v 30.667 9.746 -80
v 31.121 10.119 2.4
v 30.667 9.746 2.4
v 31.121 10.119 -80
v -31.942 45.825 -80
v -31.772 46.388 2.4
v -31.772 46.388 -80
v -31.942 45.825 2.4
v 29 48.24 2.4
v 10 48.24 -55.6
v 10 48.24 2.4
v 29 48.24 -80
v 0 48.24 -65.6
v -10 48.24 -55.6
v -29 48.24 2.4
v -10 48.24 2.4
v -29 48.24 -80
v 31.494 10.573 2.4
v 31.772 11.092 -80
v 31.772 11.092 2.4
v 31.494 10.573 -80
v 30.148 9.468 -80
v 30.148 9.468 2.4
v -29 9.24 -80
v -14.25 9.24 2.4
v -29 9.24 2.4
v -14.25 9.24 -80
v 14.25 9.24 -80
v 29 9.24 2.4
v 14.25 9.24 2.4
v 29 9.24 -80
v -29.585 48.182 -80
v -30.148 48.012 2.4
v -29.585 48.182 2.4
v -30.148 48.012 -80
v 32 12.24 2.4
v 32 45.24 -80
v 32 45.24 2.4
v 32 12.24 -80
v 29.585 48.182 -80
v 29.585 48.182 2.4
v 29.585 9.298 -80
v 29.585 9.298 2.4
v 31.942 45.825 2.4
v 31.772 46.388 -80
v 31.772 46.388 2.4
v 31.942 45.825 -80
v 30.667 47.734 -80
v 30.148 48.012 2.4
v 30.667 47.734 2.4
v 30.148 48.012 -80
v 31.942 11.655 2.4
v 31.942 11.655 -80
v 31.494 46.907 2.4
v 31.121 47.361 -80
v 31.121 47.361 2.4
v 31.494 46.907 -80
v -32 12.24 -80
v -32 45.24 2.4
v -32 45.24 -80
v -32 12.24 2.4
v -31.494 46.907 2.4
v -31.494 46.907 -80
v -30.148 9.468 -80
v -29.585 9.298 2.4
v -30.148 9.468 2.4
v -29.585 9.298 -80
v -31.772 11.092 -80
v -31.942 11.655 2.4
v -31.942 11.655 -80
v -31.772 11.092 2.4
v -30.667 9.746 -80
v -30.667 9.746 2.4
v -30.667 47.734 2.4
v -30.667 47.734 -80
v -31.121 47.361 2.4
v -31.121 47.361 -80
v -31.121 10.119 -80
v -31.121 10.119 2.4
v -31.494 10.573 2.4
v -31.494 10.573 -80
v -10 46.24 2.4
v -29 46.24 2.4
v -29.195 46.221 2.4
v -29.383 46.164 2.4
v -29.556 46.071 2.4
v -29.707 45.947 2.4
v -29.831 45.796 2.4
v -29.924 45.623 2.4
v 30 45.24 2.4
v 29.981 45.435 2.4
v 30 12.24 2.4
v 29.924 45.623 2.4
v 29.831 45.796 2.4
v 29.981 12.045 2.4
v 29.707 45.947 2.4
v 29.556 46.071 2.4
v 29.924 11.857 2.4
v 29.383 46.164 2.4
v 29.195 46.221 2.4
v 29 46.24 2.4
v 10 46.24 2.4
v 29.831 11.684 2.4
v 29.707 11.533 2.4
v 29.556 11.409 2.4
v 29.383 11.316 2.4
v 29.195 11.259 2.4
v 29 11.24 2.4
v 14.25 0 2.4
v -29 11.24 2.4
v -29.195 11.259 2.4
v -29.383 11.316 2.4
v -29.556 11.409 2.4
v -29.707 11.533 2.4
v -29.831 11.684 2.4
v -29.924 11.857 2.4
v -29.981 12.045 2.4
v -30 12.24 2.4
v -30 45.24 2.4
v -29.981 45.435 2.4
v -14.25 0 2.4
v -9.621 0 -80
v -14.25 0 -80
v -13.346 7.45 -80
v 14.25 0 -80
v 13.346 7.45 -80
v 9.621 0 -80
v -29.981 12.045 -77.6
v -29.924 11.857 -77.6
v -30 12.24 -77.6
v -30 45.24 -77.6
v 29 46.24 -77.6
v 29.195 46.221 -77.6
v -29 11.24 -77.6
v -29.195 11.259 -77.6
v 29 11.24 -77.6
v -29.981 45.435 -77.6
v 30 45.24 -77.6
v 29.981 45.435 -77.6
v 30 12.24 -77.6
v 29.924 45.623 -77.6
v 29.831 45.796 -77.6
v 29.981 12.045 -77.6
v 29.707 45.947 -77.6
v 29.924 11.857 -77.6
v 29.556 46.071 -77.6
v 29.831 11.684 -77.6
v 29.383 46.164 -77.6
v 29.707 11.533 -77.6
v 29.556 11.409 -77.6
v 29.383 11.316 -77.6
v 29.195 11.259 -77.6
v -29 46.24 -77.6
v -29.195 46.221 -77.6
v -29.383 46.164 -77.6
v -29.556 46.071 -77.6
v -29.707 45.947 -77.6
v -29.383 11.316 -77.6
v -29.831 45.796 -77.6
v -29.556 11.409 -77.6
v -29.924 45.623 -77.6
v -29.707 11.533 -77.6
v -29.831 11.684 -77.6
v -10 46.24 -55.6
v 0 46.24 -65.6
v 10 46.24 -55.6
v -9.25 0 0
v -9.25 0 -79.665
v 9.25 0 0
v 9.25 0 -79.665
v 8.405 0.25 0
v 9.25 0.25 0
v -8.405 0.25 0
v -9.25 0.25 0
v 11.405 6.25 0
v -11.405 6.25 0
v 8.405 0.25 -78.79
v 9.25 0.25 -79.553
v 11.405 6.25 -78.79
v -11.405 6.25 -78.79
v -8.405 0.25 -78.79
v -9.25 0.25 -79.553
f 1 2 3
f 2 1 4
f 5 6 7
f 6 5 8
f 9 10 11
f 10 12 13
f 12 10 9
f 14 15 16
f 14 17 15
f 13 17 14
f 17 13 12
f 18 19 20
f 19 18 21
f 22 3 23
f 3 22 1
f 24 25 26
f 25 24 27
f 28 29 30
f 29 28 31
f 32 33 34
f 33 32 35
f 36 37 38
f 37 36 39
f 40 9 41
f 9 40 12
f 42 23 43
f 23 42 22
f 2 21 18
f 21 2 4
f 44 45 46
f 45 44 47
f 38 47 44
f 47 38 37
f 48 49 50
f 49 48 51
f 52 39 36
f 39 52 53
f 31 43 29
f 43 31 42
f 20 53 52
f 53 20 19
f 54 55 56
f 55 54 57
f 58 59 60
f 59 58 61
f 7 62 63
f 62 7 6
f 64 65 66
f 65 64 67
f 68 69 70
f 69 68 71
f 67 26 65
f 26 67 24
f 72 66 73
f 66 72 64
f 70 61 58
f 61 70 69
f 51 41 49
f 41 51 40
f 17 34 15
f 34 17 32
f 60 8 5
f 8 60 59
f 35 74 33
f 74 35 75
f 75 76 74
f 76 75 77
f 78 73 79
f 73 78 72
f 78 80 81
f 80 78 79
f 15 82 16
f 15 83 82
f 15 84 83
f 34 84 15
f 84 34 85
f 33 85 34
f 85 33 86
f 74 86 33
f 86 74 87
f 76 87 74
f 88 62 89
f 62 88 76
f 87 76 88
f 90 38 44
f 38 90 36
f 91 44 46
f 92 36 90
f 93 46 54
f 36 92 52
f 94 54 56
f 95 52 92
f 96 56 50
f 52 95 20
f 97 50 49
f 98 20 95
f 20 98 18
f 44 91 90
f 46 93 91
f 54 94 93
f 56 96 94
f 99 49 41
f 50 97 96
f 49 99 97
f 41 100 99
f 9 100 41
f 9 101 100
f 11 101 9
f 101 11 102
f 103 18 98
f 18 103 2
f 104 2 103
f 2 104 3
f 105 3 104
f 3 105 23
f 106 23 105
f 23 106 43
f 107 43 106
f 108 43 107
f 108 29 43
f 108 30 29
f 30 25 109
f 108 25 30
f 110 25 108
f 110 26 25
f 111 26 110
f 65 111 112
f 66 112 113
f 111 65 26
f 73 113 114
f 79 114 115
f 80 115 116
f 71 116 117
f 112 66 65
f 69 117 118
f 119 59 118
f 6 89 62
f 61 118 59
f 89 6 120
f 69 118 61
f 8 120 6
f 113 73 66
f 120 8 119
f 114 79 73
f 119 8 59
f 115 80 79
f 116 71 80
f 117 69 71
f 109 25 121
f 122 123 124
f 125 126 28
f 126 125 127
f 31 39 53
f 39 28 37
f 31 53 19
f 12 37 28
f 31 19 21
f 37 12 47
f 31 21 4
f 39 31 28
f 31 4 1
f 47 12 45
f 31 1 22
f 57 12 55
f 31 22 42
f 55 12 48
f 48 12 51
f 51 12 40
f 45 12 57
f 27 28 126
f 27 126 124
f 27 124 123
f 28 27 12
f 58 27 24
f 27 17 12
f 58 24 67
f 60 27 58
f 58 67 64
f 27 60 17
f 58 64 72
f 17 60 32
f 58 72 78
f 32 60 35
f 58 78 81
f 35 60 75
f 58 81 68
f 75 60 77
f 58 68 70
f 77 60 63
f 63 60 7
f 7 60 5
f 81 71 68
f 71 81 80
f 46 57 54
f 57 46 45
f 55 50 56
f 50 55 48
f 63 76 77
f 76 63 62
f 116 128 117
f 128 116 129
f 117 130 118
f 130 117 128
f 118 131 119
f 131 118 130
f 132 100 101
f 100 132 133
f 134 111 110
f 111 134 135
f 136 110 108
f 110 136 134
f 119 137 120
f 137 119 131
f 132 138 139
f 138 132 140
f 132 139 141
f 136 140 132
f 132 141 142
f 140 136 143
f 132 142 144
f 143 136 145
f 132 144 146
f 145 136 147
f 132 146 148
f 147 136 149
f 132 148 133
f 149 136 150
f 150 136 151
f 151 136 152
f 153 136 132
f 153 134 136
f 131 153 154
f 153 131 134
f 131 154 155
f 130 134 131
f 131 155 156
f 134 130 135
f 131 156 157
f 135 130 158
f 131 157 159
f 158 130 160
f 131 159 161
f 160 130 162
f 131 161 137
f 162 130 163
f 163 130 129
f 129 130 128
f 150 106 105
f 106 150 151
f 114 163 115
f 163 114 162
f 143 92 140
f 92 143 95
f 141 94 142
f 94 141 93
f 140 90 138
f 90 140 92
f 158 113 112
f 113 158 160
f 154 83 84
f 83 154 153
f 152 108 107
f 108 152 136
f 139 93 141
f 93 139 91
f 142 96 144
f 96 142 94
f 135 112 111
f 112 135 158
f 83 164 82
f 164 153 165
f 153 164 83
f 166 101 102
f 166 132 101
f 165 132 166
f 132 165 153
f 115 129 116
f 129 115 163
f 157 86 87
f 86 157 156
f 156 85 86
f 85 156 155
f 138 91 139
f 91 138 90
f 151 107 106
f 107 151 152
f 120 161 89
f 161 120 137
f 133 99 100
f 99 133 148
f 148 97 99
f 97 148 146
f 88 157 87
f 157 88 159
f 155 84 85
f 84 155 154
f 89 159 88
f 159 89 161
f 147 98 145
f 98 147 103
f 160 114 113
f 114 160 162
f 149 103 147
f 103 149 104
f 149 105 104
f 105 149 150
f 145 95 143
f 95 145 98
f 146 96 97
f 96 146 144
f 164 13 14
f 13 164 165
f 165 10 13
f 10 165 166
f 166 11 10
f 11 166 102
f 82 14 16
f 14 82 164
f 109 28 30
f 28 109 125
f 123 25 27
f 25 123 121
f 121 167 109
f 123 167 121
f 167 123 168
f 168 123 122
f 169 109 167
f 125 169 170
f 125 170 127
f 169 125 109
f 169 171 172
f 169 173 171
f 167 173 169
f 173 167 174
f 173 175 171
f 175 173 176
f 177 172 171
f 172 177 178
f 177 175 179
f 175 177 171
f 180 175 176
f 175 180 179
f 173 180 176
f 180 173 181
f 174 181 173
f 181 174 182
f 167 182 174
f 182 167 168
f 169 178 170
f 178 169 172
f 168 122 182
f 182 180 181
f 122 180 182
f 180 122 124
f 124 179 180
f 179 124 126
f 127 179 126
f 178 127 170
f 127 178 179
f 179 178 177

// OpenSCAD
// Bunk cubby: a customizable open-top bin that hangs on rail clips
// (clip.scad), lowered on from above. Remotes, glasses, books, toys: set the inside size, add
// dividers, and pick 1 or 2 clips.
//
// Print upright as modeled, no supports.

use <rail-clip.scad>

/* [Inside size] */
width = 60;       // along the rail
depth = 35;       // away from the rail
height = 80;      // wall height above the floor
dividers = 0;     // evenly spaced, running away from the rail
front_slot = 20;  // slot down the front wall to see and grab (0 for none)

/* [Build] */
wall = 2;
floor_t = 2.4;
corner_r = 3;
clips = 1;        // 1 or 2 rail clips
clip_pitch = 120; // clip spacing when using 2; must miss the bed's posts

/* [Fit] */
dt_clear = 0.25;

part = "cubby"; // [cubby, assembly, rails, clips, mounted]

/* [Hidden] */
$fn = 32;
eps = 0.01;

ow = width + 2 * wall;
od = depth + 2 * wall;
y0 = dt_block_d(dt_clear) - eps;
oh = floor_t + height;
bot = dt_roof() - oh;  // rim flush with the socket roof
xs = clips >= 2 ? [-clip_pitch / 2, clip_pitch / 2] : [0];

module rbox(w, d, h, r) {
  hull() for (x = [r, w - r], y = [r, d - r]) translate([x, y, 0]) cylinder(r = r, h = h);
}

module bin() {
  difference() {
    translate([-ow / 2, y0, bot]) rbox(ow, od, oh, corner_r);
    translate([-width / 2, y0 + wall, bot + floor_t]) rbox(width, depth, oh, max(0.5, corner_r - wall));
    if (front_slot > 0) {
      sz = bot + floor_t + 12;
      translate([0, y0 + od + 1, 0]) rotate([90, 0, 0]) linear_extrude(wall + 2)
        polygon([[-front_slot / 2, bot + oh + 1], [-front_slot / 2, sz + front_slot / 2],
                 [0, sz], [front_slot / 2, sz + front_slot / 2], [front_slot / 2, bot + oh + 1]]);
    }
  }
  if (dividers > 0)
    for (i = [1 : dividers])
      translate([-width / 2 + i * width / (dividers + 1) - wall / 2, y0 + wall - eps, bot + floor_t - eps])
        cube([wall, depth + 2 * eps, height * 0.85]);
}

module cubby() { with_mounts(-bot, dt_clear, xs) bin(); }

if (part == "assembly") bunk_assembly(xs) cubby();
else if (part == "cubby") cubby();
else bunk_piece(part, xs) cubby();
